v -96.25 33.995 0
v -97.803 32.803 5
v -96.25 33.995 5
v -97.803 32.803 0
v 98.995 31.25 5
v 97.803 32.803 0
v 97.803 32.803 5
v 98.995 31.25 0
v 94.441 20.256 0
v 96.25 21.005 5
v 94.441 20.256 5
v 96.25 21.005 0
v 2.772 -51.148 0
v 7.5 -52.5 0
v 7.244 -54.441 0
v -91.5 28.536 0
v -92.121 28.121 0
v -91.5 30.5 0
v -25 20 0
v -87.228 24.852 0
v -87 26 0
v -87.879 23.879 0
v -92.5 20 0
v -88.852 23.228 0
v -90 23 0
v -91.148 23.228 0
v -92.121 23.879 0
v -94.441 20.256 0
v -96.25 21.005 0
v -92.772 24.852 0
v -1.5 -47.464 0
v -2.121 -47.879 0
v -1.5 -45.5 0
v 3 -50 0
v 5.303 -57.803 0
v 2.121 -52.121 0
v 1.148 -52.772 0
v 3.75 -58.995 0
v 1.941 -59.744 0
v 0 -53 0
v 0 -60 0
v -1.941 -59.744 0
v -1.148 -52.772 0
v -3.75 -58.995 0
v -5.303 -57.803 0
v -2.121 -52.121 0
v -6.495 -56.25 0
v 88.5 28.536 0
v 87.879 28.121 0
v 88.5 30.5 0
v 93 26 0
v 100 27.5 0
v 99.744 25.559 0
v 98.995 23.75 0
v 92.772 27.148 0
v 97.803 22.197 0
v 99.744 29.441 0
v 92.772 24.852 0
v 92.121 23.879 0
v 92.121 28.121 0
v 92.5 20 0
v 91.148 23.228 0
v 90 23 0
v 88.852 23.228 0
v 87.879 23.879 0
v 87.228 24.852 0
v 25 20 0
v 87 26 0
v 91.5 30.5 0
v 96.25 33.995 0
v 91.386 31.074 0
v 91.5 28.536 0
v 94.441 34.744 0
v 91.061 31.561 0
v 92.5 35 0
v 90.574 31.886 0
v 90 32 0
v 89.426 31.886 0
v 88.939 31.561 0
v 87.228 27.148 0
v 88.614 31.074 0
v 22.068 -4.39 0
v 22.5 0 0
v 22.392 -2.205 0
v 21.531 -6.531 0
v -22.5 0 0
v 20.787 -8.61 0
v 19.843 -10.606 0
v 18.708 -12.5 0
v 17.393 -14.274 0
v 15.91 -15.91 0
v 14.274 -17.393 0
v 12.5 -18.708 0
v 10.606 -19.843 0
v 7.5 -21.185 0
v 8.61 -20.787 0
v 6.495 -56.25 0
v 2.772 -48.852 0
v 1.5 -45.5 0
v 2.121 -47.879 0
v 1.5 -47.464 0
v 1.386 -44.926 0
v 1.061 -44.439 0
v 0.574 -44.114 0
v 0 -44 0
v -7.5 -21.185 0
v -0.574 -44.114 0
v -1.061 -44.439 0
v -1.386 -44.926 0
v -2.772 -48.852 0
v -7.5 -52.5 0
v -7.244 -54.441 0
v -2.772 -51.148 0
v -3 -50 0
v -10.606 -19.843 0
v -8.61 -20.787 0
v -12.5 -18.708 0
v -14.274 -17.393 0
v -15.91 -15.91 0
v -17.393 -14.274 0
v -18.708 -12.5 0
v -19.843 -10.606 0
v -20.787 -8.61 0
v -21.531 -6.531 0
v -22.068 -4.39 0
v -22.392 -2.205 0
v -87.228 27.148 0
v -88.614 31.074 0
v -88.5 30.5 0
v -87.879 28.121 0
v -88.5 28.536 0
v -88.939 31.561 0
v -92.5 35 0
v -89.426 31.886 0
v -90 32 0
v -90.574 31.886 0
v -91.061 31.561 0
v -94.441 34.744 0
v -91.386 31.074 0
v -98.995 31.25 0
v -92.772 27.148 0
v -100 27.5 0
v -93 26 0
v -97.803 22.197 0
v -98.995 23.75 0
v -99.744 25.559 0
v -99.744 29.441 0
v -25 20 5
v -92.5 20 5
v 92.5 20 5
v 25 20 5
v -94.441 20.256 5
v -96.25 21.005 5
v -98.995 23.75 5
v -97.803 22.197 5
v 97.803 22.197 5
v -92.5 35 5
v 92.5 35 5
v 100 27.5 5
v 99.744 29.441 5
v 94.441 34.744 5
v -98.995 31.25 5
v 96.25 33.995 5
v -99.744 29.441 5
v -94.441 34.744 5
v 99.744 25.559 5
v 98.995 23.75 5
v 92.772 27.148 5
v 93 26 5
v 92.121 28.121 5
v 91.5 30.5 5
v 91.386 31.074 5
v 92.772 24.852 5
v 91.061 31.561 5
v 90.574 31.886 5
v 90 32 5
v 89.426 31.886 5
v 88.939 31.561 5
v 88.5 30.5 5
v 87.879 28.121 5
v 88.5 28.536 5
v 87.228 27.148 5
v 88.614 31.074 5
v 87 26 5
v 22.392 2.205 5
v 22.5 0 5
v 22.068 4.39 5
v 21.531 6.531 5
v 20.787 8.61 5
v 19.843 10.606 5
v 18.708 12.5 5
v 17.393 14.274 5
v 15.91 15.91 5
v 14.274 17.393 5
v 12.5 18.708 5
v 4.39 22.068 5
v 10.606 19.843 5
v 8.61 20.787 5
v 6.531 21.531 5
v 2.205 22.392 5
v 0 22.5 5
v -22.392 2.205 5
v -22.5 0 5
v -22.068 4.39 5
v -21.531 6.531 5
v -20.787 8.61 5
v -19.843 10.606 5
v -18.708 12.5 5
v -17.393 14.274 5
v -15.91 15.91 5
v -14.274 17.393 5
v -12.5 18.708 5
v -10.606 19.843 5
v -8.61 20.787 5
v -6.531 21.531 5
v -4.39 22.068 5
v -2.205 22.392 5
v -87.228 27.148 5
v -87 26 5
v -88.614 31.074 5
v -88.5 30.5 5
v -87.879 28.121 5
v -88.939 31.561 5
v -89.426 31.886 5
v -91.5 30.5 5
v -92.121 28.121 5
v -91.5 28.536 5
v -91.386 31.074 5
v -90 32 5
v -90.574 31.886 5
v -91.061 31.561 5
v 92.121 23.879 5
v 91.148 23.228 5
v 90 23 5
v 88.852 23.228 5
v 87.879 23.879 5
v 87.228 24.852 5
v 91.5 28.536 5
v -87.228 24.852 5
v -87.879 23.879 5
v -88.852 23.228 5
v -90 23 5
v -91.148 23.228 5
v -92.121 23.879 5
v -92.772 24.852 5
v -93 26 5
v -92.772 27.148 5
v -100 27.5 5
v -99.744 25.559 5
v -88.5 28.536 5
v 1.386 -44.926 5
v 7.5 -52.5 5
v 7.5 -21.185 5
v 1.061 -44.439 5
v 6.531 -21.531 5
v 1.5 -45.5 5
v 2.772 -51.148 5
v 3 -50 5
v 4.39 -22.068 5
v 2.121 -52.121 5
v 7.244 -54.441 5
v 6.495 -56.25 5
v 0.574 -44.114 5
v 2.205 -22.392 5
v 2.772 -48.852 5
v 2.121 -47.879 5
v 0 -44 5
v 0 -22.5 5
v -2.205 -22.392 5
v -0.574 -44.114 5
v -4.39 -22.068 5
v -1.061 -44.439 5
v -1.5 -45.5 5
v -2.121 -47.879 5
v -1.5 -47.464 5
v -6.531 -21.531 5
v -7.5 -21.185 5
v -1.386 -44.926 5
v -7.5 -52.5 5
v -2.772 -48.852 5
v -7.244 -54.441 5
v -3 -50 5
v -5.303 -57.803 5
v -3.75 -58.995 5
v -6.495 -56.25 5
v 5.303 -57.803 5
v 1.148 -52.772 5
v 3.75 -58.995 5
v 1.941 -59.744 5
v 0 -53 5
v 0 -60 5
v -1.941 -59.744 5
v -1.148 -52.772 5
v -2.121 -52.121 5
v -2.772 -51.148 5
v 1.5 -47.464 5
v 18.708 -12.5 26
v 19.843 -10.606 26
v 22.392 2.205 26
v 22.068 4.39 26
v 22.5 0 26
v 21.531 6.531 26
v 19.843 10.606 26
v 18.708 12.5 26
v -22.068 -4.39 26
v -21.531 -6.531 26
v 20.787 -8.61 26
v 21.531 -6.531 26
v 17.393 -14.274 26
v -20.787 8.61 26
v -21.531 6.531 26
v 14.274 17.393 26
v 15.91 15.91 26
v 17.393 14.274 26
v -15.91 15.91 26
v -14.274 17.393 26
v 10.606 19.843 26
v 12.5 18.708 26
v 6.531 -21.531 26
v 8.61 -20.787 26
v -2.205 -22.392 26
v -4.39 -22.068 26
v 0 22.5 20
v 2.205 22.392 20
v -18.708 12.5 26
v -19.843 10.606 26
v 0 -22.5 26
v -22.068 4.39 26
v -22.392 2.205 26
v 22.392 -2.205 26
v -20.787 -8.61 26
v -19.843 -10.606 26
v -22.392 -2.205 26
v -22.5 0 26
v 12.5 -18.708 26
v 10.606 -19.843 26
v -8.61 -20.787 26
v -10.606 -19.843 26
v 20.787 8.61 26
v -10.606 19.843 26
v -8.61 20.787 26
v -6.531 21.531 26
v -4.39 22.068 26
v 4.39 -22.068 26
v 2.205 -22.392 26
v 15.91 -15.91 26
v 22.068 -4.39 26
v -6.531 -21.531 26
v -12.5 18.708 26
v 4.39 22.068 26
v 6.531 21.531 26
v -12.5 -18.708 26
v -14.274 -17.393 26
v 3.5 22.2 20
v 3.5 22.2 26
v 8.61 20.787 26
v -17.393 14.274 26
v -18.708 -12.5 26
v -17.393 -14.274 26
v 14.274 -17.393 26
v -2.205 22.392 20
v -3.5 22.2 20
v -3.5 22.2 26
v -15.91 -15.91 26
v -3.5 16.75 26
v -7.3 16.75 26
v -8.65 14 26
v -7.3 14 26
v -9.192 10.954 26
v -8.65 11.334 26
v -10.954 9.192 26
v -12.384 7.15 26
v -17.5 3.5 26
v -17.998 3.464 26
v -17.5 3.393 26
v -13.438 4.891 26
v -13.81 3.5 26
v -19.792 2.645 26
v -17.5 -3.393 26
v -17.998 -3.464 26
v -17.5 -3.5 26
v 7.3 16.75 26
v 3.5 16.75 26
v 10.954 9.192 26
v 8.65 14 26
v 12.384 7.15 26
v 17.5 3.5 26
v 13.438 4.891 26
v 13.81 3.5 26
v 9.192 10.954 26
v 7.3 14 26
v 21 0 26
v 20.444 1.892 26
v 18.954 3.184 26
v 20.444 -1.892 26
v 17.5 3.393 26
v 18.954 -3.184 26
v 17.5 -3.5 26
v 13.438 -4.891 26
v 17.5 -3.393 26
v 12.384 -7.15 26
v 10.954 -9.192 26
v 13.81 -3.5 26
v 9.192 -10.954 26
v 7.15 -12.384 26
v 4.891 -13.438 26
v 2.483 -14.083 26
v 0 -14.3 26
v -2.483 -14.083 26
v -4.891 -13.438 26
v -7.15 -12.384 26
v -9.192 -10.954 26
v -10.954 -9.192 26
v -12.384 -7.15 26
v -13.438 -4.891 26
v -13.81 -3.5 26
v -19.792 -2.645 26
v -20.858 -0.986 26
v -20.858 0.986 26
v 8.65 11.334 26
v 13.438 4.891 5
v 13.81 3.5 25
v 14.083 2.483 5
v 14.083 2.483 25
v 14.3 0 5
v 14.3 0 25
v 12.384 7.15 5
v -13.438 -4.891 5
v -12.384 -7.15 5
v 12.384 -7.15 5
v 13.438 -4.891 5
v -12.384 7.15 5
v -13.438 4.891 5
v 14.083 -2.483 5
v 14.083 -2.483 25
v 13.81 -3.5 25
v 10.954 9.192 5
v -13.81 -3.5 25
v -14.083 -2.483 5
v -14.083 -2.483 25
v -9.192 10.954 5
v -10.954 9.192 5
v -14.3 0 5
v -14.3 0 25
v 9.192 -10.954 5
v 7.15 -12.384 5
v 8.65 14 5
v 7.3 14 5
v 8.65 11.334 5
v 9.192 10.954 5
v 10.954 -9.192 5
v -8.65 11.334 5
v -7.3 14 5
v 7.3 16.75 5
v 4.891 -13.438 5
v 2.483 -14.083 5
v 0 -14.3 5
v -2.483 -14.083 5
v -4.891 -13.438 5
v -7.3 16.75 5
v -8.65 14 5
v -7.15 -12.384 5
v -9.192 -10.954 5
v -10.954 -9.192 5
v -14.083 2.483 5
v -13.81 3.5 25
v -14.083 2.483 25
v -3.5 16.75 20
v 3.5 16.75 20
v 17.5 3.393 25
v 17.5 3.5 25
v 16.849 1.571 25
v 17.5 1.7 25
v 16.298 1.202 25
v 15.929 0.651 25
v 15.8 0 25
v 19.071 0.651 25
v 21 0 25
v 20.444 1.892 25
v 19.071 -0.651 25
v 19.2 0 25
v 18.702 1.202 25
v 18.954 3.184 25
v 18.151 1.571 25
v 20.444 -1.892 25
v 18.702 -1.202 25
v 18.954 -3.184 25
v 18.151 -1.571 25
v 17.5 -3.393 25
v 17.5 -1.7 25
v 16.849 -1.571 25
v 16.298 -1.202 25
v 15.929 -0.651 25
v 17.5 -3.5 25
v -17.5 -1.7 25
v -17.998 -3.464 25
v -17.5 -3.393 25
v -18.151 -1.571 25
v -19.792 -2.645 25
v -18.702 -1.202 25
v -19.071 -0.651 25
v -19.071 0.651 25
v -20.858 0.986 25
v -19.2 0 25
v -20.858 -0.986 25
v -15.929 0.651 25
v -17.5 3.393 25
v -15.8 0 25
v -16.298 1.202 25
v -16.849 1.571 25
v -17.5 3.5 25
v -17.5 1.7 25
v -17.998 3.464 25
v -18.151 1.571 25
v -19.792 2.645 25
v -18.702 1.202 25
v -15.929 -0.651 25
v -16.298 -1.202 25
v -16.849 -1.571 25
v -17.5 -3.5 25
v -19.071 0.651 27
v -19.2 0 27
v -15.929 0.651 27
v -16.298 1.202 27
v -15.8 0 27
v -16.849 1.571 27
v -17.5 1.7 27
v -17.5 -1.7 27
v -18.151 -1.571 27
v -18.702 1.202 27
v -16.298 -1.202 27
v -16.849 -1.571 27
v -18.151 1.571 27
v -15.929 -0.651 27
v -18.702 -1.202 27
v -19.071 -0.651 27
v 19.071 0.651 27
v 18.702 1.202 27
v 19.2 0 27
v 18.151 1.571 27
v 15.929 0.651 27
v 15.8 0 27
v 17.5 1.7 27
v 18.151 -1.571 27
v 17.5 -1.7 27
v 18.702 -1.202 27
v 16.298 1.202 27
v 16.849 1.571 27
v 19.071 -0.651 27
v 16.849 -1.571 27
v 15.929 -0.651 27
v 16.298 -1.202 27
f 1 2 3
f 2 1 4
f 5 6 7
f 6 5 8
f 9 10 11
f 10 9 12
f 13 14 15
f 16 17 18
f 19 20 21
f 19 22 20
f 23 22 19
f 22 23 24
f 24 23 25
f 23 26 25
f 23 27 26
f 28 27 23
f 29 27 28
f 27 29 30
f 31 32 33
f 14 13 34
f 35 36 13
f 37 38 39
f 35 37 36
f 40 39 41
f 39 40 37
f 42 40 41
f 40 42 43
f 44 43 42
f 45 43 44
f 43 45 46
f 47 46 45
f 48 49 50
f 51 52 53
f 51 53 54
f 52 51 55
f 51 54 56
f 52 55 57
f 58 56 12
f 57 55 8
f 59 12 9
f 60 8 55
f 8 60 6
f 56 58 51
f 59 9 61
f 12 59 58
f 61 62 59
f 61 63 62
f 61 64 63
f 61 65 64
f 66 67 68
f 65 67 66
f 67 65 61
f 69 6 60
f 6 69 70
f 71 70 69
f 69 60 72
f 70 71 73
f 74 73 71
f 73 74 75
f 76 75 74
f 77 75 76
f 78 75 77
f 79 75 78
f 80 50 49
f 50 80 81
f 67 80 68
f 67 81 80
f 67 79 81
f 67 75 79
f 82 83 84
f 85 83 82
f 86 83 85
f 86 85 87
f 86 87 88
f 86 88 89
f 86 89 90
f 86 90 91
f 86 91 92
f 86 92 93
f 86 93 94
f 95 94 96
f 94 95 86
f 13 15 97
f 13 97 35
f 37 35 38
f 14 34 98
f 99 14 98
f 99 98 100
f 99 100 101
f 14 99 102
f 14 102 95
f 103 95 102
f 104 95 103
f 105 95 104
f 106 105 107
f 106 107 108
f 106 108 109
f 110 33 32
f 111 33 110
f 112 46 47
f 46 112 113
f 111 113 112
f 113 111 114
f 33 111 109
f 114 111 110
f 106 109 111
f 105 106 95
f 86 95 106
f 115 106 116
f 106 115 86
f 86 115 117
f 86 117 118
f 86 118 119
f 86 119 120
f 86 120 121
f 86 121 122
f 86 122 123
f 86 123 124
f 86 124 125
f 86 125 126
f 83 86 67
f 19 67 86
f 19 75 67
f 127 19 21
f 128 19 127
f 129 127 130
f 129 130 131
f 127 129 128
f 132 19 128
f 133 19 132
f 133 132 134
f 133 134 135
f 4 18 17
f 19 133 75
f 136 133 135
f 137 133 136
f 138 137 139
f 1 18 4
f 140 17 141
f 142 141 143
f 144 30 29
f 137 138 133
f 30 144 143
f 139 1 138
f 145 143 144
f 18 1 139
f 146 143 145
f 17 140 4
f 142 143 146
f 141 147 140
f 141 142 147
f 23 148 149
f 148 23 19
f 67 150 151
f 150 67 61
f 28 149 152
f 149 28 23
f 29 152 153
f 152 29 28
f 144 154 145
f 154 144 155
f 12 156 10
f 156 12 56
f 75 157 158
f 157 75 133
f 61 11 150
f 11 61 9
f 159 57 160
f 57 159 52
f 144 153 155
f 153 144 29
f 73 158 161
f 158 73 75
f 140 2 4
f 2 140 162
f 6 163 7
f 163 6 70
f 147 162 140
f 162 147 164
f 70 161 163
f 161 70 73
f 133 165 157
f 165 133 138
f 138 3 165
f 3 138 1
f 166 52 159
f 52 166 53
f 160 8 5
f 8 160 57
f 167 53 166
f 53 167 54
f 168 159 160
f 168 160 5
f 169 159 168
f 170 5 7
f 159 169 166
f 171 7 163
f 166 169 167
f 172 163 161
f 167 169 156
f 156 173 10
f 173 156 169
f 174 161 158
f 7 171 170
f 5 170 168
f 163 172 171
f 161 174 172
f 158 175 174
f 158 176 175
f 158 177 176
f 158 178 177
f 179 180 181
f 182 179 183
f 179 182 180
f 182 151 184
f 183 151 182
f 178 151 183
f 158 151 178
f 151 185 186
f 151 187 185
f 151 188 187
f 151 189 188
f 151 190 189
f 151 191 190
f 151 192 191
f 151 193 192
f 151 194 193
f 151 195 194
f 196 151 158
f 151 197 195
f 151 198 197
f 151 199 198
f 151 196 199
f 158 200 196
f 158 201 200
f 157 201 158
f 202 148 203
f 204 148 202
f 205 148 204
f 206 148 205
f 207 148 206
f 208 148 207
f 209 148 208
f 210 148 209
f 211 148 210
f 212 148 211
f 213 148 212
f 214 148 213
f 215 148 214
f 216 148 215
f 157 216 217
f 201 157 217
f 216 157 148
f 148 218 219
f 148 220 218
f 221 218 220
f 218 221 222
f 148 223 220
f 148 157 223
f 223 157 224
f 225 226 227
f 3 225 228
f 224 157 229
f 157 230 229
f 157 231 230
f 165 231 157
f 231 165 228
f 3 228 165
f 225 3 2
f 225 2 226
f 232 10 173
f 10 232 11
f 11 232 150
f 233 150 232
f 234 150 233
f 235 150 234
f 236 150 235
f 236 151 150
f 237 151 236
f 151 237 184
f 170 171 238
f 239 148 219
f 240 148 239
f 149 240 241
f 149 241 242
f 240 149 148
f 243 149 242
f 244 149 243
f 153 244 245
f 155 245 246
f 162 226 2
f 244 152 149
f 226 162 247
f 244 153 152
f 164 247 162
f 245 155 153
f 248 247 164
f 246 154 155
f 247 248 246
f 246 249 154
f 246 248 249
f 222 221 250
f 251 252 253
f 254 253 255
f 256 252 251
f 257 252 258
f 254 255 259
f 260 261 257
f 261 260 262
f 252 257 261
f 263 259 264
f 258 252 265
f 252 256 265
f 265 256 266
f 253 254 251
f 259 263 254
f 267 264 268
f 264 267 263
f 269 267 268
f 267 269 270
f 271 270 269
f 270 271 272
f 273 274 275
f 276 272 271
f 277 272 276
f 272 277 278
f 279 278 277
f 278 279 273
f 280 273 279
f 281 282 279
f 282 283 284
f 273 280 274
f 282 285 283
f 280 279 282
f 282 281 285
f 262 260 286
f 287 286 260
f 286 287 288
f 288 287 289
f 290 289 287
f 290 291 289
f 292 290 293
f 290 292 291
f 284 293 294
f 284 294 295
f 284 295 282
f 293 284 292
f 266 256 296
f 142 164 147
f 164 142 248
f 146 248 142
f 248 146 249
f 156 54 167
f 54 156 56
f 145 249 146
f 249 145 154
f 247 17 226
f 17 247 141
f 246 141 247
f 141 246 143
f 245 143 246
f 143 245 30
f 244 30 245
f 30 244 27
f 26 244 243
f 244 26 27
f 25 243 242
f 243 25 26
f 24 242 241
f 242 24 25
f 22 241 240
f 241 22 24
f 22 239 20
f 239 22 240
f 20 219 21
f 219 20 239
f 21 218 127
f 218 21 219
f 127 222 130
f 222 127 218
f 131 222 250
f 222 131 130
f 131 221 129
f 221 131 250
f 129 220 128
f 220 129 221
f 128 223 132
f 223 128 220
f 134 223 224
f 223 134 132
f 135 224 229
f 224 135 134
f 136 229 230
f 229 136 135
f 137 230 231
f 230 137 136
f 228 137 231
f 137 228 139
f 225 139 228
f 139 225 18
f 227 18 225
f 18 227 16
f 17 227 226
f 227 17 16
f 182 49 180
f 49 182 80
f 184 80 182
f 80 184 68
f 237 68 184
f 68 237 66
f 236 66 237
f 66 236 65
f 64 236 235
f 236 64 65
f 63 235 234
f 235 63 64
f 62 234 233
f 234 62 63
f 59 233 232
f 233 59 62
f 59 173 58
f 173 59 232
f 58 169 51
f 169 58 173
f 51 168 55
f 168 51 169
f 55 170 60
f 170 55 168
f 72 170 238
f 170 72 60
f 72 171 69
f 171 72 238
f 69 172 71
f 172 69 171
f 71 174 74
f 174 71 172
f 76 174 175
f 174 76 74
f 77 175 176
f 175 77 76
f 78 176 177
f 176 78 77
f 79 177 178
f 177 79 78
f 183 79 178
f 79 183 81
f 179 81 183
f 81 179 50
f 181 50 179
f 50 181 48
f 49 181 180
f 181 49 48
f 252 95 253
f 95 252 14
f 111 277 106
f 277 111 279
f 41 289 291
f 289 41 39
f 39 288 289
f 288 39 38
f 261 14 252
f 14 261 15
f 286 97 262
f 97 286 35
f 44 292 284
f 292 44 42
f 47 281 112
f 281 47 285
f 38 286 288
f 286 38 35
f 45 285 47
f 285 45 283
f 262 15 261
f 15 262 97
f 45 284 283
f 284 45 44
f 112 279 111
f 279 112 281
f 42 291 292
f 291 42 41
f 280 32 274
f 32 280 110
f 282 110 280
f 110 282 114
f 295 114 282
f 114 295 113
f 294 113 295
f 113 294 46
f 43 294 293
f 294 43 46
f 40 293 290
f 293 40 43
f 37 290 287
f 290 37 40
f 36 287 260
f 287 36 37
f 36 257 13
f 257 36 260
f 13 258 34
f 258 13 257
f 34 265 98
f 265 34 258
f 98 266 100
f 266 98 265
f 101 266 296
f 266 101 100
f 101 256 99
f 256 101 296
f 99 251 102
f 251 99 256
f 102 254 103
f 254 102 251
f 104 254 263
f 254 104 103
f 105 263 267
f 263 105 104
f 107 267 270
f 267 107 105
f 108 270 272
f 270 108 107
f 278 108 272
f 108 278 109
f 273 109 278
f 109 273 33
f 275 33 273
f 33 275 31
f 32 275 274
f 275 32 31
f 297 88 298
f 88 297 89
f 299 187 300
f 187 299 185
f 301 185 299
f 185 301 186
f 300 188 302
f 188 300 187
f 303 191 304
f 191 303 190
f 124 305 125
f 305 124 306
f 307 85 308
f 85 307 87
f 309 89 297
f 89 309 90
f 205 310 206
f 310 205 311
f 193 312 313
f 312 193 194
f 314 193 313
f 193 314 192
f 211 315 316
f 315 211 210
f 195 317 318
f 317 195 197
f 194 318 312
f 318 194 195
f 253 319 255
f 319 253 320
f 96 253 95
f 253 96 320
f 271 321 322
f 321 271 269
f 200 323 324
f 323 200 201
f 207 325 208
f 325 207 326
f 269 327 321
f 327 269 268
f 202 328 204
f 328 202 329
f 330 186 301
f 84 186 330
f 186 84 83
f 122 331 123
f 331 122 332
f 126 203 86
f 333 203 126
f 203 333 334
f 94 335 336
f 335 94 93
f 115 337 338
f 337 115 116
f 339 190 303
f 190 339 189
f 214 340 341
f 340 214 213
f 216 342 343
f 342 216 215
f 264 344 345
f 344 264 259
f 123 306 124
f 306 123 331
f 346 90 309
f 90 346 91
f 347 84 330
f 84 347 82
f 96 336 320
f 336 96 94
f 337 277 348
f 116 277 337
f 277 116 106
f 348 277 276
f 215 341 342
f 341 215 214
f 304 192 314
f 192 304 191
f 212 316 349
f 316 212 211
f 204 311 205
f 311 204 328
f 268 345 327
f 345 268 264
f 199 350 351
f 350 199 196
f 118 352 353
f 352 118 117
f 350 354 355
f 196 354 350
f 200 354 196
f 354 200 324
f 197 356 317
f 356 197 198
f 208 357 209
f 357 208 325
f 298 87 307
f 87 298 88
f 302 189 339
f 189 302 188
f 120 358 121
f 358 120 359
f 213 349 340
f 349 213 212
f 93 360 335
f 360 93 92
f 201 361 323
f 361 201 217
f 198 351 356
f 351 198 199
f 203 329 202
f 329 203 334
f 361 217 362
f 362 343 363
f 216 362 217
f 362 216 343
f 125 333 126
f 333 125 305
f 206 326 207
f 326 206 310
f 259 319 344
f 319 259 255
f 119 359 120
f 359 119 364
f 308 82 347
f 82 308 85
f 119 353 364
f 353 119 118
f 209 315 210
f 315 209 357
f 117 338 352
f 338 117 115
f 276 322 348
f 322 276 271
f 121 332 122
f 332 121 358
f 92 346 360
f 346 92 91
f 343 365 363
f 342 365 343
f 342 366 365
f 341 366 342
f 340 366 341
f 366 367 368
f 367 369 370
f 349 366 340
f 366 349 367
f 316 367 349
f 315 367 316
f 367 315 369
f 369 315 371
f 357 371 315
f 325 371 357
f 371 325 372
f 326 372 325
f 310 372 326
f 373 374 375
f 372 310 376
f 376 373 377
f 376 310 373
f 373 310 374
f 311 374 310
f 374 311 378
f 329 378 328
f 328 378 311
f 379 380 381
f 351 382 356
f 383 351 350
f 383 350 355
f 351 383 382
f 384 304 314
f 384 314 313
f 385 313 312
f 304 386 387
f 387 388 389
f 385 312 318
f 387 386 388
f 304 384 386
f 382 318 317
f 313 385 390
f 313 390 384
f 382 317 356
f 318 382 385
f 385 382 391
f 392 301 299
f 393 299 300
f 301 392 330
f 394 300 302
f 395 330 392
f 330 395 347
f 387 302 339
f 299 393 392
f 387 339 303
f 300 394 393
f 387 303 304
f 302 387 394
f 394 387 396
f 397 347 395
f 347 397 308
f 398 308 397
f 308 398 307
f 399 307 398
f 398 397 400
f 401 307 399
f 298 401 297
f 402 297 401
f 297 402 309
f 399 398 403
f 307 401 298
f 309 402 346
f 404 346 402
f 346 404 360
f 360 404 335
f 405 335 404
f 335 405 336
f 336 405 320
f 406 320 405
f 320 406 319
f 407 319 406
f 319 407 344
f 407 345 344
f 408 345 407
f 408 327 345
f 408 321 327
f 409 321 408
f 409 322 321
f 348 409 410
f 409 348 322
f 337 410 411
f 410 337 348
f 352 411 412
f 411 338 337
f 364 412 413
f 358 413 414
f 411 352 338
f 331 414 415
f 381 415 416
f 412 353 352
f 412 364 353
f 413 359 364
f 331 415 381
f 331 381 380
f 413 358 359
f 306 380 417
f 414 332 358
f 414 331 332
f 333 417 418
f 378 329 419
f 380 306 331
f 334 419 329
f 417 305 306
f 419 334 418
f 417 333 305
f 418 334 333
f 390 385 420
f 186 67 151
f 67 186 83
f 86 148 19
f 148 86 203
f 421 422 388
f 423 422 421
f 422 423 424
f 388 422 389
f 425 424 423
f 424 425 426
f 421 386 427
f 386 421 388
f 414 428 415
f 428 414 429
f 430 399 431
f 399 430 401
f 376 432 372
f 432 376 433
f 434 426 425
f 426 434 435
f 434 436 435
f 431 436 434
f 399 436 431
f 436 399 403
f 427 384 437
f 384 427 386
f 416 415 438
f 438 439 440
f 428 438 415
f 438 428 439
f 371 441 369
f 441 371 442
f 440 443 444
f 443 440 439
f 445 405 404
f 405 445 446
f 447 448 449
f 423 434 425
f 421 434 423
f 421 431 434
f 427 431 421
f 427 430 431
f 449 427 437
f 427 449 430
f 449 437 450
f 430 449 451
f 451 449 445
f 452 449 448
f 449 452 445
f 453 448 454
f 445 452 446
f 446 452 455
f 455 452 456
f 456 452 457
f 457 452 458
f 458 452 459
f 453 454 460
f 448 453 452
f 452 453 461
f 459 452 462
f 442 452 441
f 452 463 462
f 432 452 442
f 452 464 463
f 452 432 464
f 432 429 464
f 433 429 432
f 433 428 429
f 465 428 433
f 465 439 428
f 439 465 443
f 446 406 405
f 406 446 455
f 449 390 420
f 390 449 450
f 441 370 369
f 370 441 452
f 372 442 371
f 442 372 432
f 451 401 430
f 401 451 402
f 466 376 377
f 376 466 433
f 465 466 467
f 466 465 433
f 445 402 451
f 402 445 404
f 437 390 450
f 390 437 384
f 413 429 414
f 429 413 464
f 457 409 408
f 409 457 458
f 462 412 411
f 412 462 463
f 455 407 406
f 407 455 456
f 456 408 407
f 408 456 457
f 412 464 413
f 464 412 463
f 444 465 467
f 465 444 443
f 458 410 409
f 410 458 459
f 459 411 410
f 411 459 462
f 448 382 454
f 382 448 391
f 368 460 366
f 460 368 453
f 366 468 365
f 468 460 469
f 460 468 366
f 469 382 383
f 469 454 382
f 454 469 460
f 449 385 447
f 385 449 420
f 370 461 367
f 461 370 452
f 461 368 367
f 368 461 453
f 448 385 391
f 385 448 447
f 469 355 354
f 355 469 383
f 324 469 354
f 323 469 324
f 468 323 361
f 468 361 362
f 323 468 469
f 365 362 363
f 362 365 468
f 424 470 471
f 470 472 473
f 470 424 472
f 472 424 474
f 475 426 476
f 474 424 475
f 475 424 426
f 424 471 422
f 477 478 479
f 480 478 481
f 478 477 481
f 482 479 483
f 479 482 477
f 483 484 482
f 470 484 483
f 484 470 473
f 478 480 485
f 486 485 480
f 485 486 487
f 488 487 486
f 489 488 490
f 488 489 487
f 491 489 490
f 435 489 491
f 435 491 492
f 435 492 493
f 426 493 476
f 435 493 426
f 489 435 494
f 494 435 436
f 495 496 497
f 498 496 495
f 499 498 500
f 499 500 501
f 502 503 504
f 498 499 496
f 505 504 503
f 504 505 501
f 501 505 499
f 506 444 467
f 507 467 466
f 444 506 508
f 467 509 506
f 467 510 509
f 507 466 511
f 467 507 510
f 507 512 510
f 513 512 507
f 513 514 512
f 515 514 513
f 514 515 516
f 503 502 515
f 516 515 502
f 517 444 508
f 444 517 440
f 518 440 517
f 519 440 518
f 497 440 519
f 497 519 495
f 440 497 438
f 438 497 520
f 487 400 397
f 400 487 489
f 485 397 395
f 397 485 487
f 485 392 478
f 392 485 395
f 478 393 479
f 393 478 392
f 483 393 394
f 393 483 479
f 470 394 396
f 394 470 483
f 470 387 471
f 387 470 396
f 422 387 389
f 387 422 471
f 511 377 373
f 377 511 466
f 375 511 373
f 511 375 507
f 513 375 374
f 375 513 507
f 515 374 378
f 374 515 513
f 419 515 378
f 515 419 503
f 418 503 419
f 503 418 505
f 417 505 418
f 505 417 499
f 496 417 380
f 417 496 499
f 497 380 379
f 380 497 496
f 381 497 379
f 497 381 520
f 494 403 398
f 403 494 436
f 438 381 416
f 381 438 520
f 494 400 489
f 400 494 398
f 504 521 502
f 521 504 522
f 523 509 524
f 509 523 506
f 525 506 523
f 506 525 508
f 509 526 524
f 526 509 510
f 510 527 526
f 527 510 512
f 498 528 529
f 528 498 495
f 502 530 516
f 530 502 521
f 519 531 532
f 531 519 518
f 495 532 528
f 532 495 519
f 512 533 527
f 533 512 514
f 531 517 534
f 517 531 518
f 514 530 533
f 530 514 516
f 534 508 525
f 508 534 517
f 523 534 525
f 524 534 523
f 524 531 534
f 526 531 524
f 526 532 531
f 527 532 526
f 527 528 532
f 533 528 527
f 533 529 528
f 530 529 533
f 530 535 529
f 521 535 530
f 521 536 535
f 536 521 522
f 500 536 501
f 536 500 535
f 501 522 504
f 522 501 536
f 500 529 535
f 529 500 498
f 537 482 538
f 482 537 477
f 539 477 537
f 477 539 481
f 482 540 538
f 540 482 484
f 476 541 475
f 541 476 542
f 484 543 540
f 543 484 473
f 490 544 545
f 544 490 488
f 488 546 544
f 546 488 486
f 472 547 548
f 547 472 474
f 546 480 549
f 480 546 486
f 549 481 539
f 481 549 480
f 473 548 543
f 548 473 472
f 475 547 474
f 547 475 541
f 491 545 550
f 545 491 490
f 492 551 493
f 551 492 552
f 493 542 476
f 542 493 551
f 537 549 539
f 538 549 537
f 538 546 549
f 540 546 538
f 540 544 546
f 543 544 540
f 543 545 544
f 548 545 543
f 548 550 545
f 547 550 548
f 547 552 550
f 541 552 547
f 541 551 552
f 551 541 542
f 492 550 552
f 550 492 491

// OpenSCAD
stepperDepth = 19 + 2; // has a couple mm extra
holderBacking = 5;
screwPanelHeight = 1;

stepperRadiusFudge = 0.3; // millimeter increase

// create a rounded horizontal bar sitting on z=0 and centered in x,y
module roundedHorizontalBar(width, height, depth) {
    radius = height/2;
    
    linear_extrude(height=depth)
    union() {
        square([width - 2*radius, height], center=true);
        
        for (direction = [-1, 1]) {
            position = direction * (width/2 - radius);
            
            translate([position, 0])
            circle(r=radius, center=true);
        }
    }
}

module trapezoid(bottomWidth, topWidth, height) {
    polygon(points=[
        [-bottomWidth/2, 0],
        [-topWidth/2, height],
        [topWidth/2, height],
        [bottomWidth/2, 0]
    ]);
}

// create a simplified stepper on its back centered in x, y.
module stepper() {
    radius = 14;
    translate([0,0,stepperDepth/2])
    cylinder(r=radius + stepperRadiusFudge, h=stepperDepth, center=true, $fn=36);
    
    rectHeight = 2.75;
    topRectWidth = 14.6;
    translate([-topRectWidth/2, 0, 0])
    cube([topRectWidth, radius + rectHeight, stepperDepth]);
    
    bottomRectWidth = 17.3;
    translate([-bottomRectWidth/2, 0, 0])
    cube([bottomRectWidth, radius, stepperDepth]);
    
    cordWidth = 7;
    cordHeight = 6;
    translate([-cordWidth/2, 0, stepperDepth - cordHeight])
    cube([cordWidth, radius + 50, cordHeight]);
    
    screwPanelSize = 7;
    translate([0, 0, stepperDepth - screwPanelHeight])
    roundedHorizontalBar(2*radius + 2*screwPanelSize, screwPanelSize, screwPanelHeight);
}

module stepperPegs() {
    stepperRadius = 14;
    pegHeight = 2;
    pegOffset = 3.5;
    pegRadius = 2 - 0.3; // fudge factor
    
    for (direction = [-1, 1]) {
        position = direction * (stepperRadius + pegOffset);
        
        translate([position, 0, stepperDepth + holderBacking + pegHeight/2 - screwPanelHeight])
        cylinder(r=pegRadius, h=pegHeight, center=true, $fn=16);
    }
}

module horizontalBar(depth) {
    width = 200;
    height = 15;
    holeOffsetX = 10;
    holeOffsetY = 6;
    
    difference() {
        translate([0, height/2, 0])
        roundedHorizontalBar(width, height, depth);
        
        translate([-width/2 + holeOffsetX, holeOffsetY, 0])
        mountHole();
        
        translate([width/2 - holeOffsetX, holeOffsetY, 0])
        mountHole();
    }
}

module verticalBar(depth) {
    width = 15;
    height = 80;
    holeOffsetY = 10;
    
    radius = width / 2;
    
    difference() {
        union() {
            translate([-width/2, -(height - radius), 0])
            cube([width, height - radius, depth]);
            
            translate([0, - (height - radius), depth/2])
            cylinder(r=radius, h=depth, center=true);
        }
            
        translate([0, -height + holeOffsetY, 0])
        mountHole();
    }
}

module mountBars() {
    mountDepth = 5;
    horizontalBar(mountDepth);
    verticalBar(mountDepth);
}


// create a mount hole centered at the origin
module mountHole() {
    headRadius = 3;
    shaftRadius = 1.5;
    height = 9;
    
    squareHeight = height - headRadius- shaftRadius;
    
    linear_extrude(height=50)
    union() {
        circle(r=headRadius, center=true, $fn=16);
        
        translate([-shaftRadius,0, 0])
        square([2*shaftRadius, squareHeight]);
        
        translate([0, squareHeight, 0])
        circle(r=shaftRadius, center=true, $fn=16);
    }
}

// the wall mounted chassis that holds the stepper.
// has holes for mounting screws.
// and a high surface area for velcro.
module chassis() {
    holderSize = 45;
    
    translate([0, 0, (stepperDepth + holderBacking)/2])
    cylinder(r=holderSize/2, h=stepperDepth+holderBacking, center=true, $fn=64);
    
    yOffset = 20;
    translate([0, yOffset, 0])
    mountBars();
    
    linear_extrude(5)
    trapezoid(holderSize, 50, yOffset);
}

module mainAssembly() {
    difference() {
        chassis();
        
        translate([0,0,holderBacking])
        stepper();
    }
    
    stepperPegs();
}

mainAssembly();
